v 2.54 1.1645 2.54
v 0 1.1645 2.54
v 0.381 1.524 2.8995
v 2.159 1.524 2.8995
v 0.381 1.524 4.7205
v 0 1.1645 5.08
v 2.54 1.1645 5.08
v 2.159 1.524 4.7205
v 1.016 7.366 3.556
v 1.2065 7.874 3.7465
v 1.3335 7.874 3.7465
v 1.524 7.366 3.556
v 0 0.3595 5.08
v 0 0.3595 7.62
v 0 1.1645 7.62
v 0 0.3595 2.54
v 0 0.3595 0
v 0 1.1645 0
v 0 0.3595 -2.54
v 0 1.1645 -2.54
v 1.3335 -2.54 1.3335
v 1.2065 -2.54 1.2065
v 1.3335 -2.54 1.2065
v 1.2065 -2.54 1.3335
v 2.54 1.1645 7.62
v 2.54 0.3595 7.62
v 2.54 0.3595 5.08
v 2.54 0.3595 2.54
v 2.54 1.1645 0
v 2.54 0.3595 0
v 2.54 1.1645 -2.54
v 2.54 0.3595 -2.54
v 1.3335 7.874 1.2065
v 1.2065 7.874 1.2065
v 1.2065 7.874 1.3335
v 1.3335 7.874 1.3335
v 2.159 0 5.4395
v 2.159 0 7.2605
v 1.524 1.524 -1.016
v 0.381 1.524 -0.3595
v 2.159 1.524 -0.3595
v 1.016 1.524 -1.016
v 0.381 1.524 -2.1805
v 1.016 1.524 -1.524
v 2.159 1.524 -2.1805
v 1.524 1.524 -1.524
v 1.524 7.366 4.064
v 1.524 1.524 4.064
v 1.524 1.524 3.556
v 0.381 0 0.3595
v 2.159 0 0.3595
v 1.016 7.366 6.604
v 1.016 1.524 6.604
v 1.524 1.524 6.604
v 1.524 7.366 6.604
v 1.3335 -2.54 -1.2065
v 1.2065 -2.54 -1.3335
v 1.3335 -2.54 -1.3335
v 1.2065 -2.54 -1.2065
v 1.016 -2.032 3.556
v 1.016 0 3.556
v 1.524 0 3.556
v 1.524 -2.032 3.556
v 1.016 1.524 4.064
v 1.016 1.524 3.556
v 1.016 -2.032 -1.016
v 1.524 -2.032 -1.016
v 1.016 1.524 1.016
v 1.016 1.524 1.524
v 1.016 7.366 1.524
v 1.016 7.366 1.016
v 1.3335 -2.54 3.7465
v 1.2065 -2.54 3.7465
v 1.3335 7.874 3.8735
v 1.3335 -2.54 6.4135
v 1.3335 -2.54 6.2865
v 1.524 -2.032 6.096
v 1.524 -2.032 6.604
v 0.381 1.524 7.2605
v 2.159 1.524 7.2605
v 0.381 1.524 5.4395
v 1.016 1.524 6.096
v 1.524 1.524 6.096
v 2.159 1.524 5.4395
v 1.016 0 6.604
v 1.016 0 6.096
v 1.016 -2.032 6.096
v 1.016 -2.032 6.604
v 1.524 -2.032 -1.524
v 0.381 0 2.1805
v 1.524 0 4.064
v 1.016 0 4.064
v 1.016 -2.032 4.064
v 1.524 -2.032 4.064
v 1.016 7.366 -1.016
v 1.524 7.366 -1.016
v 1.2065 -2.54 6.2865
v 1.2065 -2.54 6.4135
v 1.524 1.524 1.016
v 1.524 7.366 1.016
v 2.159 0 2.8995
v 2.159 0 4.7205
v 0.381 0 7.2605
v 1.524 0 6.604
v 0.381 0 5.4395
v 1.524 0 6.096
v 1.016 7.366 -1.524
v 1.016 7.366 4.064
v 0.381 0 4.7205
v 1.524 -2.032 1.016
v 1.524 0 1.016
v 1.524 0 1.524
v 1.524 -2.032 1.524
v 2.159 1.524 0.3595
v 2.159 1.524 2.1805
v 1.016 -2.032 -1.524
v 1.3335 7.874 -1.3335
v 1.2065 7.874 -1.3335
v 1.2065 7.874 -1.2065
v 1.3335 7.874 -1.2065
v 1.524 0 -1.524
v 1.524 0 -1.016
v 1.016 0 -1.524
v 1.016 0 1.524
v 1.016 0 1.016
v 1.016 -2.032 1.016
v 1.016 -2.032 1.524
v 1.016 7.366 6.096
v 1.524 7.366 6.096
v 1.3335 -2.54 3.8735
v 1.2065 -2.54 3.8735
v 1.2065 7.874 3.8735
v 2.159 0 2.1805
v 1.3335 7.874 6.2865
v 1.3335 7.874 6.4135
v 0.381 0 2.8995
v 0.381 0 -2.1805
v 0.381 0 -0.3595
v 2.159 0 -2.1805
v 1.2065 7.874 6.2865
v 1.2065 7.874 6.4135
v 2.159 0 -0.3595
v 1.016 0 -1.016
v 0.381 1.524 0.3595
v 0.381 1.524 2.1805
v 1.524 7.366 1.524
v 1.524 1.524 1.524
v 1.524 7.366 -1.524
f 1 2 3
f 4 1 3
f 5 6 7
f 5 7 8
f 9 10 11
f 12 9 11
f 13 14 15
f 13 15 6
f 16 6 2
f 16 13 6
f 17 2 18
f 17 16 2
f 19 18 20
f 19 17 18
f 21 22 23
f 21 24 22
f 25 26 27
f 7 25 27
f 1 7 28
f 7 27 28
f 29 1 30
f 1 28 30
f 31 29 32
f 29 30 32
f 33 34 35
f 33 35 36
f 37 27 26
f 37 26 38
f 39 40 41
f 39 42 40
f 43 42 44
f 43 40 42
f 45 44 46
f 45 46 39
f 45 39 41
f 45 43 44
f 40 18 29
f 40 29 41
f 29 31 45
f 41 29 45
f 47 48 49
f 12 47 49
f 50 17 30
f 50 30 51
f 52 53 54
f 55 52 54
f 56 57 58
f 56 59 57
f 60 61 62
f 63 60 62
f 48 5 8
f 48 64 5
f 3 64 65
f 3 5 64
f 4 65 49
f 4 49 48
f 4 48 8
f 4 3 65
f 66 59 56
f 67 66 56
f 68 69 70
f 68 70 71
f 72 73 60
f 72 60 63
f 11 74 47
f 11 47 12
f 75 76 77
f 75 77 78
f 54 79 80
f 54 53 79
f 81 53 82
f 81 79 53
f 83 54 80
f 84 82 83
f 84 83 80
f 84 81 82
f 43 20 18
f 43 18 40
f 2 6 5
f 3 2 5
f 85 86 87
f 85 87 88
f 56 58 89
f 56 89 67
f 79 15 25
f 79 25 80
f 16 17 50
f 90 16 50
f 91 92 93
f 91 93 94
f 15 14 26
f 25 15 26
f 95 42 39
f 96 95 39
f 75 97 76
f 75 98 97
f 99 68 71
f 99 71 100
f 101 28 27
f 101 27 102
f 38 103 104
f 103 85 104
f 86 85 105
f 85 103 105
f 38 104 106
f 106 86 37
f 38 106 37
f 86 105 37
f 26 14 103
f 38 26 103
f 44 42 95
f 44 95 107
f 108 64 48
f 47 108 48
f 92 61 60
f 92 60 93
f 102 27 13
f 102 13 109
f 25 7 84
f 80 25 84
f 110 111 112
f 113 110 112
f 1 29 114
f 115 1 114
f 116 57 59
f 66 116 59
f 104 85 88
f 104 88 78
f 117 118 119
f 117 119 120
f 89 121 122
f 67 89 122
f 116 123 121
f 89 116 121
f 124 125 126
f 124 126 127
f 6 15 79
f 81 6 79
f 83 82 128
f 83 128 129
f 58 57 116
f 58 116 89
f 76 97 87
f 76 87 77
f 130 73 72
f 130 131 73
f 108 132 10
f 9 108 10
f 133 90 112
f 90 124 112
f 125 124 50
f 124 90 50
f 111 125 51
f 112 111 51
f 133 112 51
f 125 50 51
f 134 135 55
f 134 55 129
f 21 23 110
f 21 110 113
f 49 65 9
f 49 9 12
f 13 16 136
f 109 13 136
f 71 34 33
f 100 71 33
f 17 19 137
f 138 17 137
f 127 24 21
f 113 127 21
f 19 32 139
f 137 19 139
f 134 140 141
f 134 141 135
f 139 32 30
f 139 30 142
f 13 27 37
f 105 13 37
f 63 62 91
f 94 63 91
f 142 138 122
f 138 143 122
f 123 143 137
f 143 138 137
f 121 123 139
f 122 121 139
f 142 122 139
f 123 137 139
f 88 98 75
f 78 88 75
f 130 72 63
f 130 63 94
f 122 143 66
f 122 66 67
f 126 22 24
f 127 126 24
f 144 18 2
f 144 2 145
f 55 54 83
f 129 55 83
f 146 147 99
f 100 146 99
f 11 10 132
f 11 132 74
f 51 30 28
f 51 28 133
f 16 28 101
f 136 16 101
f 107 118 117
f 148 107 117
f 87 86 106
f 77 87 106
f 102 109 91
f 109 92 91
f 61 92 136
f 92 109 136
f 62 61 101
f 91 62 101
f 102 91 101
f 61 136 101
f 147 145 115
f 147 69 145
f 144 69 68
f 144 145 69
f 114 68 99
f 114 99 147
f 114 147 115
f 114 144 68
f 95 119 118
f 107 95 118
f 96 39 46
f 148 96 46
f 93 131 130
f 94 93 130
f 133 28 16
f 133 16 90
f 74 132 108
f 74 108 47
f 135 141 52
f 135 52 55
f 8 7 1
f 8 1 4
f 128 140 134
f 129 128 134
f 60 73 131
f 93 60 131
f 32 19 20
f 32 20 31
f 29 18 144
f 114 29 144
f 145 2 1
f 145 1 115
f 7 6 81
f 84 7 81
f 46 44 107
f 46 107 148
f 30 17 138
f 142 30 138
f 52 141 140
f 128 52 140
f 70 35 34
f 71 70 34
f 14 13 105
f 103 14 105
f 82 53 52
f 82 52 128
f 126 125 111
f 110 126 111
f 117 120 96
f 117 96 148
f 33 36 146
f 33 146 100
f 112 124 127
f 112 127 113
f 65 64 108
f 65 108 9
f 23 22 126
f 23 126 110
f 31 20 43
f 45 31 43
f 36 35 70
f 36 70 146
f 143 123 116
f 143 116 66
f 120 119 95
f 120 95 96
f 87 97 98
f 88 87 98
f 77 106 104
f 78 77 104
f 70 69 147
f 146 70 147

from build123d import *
from OCP.BRepFilletAPI import BRepFilletAPI_MakeChamfer

# Parameters (mm, degrees)
SKETCH1_W                   = 2.54
SKETCH1_H                   = 2.54
BOSS_EXTRUDE1_DEPTH         = 1.524
SKETCH2_W                   = 0.508
SKETCH2_H                   = 0.508
BOSS_EXTRUDE2_DEPTH         = 6.35
SKETCH3_W                   = 0.508
SKETCH3_H                   = 0.508
BOSS_EXTRUDE3_DEPTH         = 2.54
CHAMFER1_SIZE               = 0.508
CHAMFER1_SIZE2              = 0.1905
CHAMFER2_SIZE               = 0.508
CHAMFER2_SIZE2              = 0.1905
CUT_EXTRUDE1_DEPTH          = 2.54
CUT_EXTRUDE2_DEPTH          = 2.54
LPATTERN5_COUNT             = 4
LPATTERN5_PITCH             = 2.54
CHAMFER1_OF_LPATTERN5_SIZE  = 0.508
CHAMFER1_OF_LPATTERN5_SIZE2 = 0.1905
CHAMFER2_OF_LPATTERN5_SIZE  = 0.508
CHAMFER2_OF_LPATTERN5_SIZE2 = 0.1905


with BuildPart() as part:
    # Sketch1 → Boss-Extrude1 (new body)
    with BuildSketch(Plane(origin=(0, 0, 0), x_dir=(1, 0, 0), z_dir=(0, 1, 0))):
        with Locations((1.27, 1.27)):
            Rectangle(SKETCH1_W, SKETCH1_H)
    boss_extrude1 = extrude(amount=BOSS_EXTRUDE1_DEPTH)

    # Sketch2 → Boss-Extrude2 (add)
    with BuildSketch(Plane(origin=(0, 1.524, 0), x_dir=(1, 0, 0), z_dir=(0, 1, 0))):
        with Locations((1.27, 1.27)):
            Rectangle(SKETCH2_W, SKETCH2_H)
    boss_extrude2 = extrude(amount=BOSS_EXTRUDE2_DEPTH)

    # Sketch3 → Boss-Extrude3 (add)
    with BuildSketch(Plane.XZ):
        with Locations((1.27, -1.27)):
            Rectangle(SKETCH3_W, SKETCH3_H)
    boss_extrude3 = extrude(amount=BOSS_EXTRUDE3_DEPTH)

    # Chamfer1: one chamfer whose edges measure the first distance from different faces: ONE call of the kernel's chamfer builder (chamfer() names one face for all edges)
    chamfer1_edges_1 = [part.edges().sort_by_distance(p)[0] for p in [
        (1.016, 7.874, -1.27),
    ]]
    chamfer1_side_1 = [part.faces().sort_by_distance(p)[0] for p in [
        (1.016, 4.699, -1.27),
    ]]
    chamfer1_edges_2 = [part.edges().sort_by_distance(p)[0] for p in [
        (1.27, 7.874, -1.016),
    ]]
    chamfer1_side_2 = [part.faces().sort_by_distance(p)[0] for p in [
        (1.27, 4.699, -1.016),
    ]]
    chamfer1_edges_3 = [part.edges().sort_by_distance(p)[0] for p in [
        (1.524, 7.874, -1.27),
    ]]
    chamfer1_side_3 = [part.faces().sort_by_distance(p)[0] for p in [
        (1.524, 4.699, -1.27),
    ]]
    chamfer1_edges_4 = [part.edges().sort_by_distance(p)[0] for p in [
        (1.27, 7.874, -1.524),
    ]]
    chamfer1_side_4 = [part.faces().sort_by_distance(p)[0] for p in [
        (1.27, 4.699, -1.524),
    ]]
    chamfer1 = BRepFilletAPI_MakeChamfer(part.part.solid().wrapped)
    for e in chamfer1_edges_1:
        chamfer1.Add(CHAMFER1_SIZE, CHAMFER1_SIZE2, e.wrapped, chamfer1_side_1[0].wrapped)  # the first distance lies on this face
    for e in chamfer1_edges_2:
        chamfer1.Add(CHAMFER1_SIZE, CHAMFER1_SIZE2, e.wrapped, chamfer1_side_2[0].wrapped)  # the first distance lies on this face
    for e in chamfer1_edges_3:
        chamfer1.Add(CHAMFER1_SIZE, CHAMFER1_SIZE2, e.wrapped, chamfer1_side_3[0].wrapped)  # the first distance lies on this face
    for e in chamfer1_edges_4:
        chamfer1.Add(CHAMFER1_SIZE, CHAMFER1_SIZE2, e.wrapped, chamfer1_side_4[0].wrapped)  # the first distance lies on this face
    add(Compound.cast(chamfer1.Shape()), mode=Mode.REPLACE)

    # Chamfer2: one chamfer whose edges measure the first distance from different faces: ONE call of the kernel's chamfer builder (chamfer() names one face for all edges)
    chamfer2_edges_1 = [part.edges().sort_by_distance(p)[0] for p in [
        (1.27, -2.54, -1.524),
    ]]
    chamfer2_side_1 = [part.faces().sort_by_distance(p)[0] for p in [
        (1.27, -1.27, -1.524),
    ]]
    chamfer2_edges_2 = [part.edges().sort_by_distance(p)[0] for p in [
        (1.524, -2.54, -1.27),
    ]]
    chamfer2_side_2 = [part.faces().sort_by_distance(p)[0] for p in [
        (1.524, -1.27, -1.27),
    ]]
    chamfer2_edges_3 = [part.edges().sort_by_distance(p)[0] for p in [
        (1.27, -2.54, -1.016),
    ]]
    chamfer2_side_3 = [part.faces().sort_by_distance(p)[0] for p in [
        (1.27, -1.27, -1.016),
    ]]
    chamfer2_edges_4 = [part.edges().sort_by_distance(p)[0] for p in [
        (1.016, -2.54, -1.27),
    ]]
    chamfer2_side_4 = [part.faces().sort_by_distance(p)[0] for p in [
        (1.016, -1.27, -1.27),
    ]]
    chamfer2 = BRepFilletAPI_MakeChamfer(part.part.solid().wrapped)
    for e in chamfer2_edges_1:
        chamfer2.Add(CHAMFER2_SIZE, CHAMFER2_SIZE2, e.wrapped, chamfer2_side_1[0].wrapped)  # the first distance lies on this face
    for e in chamfer2_edges_2:
        chamfer2.Add(CHAMFER2_SIZE, CHAMFER2_SIZE2, e.wrapped, chamfer2_side_2[0].wrapped)  # the first distance lies on this face
    for e in chamfer2_edges_3:
        chamfer2.Add(CHAMFER2_SIZE, CHAMFER2_SIZE2, e.wrapped, chamfer2_side_3[0].wrapped)  # the first distance lies on this face
    for e in chamfer2_edges_4:
        chamfer2.Add(CHAMFER2_SIZE, CHAMFER2_SIZE2, e.wrapped, chamfer2_side_4[0].wrapped)  # the first distance lies on this face
    add(Compound.cast(chamfer2.Shape()), mode=Mode.REPLACE)

    # Sketch4 → Cut-Extrude1 (cut)
    with BuildSketch(Plane(origin=(0, 0, -2.54), x_dir=(-1, 0, 0), z_dir=(0, 0, -1))):
        Polygon((-2.54, 1.16453539), (-2.159, 1.524), (-2.54, 1.524), align=None)
        Polygon((0, 1.524), (0, 1.16453539), (-0.381, 1.524), align=None)
        Polygon((0, 0.35946461), (-0.381, 0), (0, 0), align=None)
        Polygon((-2.54, 0), (-2.54, 0.35946461), (-2.159, 0), align=None)
    cut_extrude1 = extrude(amount=-CUT_EXTRUDE1_DEPTH, mode=Mode.SUBTRACT)

    # Sketch5 → Cut-Extrude2 (cut)
    with BuildSketch(Plane.ZY):
        Polygon((-2.54, 1.16453539), (-2.159, 1.54553539), (-2.54, 1.54553539), align=None)
        Polygon((0, 1.54553539), (0, 1.16453539), (-0.381, 1.54553539), align=None)
        Polygon((-2.54, -0.02153539), (-2.54, 0.35946461), (-2.159, -0.02153539), align=None)
        Polygon((0, 0.35946461), (-0.381, -0.02153539), (0, -0.02153539), align=None)
    cut_extrude2 = extrude(amount=-CUT_EXTRUDE2_DEPTH, mode=Mode.SUBTRACT)

    # LPattern5: Boss-Extrude1, Boss-Extrude2, Boss-Extrude3, Cut-Extrude1, Cut-Extrude2 ×4
    with Locations(*[(0, 0, i * LPATTERN5_PITCH) for i in range(1, LPATTERN5_COUNT)]):
        add(boss_extrude1)
        add(boss_extrude2)
        add(boss_extrude3)
        add(cut_extrude1, mode=Mode.SUBTRACT)
        add(cut_extrude2, mode=Mode.SUBTRACT)

    # Chamfer1 of LPattern5: one chamfer whose edges measure the first distance from different faces: ONE call of the kernel's chamfer builder (chamfer() names one face for all edges)
    chamfer1_of_lpattern5_edges_1 = [part.edges().sort_by_distance(p)[0] for p in [
        (1.016, 7.874, 1.27),
    ]]
    chamfer1_of_lpattern5_side_1 = [part.faces().sort_by_distance(p)[0] for p in [
        (1.016, 4.699, 1.27),
    ]]
    chamfer1_of_lpattern5_edges_2 = [part.edges().sort_by_distance(p)[0] for p in [
        (1.27, 7.874, 1.524),
    ]]
    chamfer1_of_lpattern5_side_2 = [part.faces().sort_by_distance(p)[0] for p in [
        (1.27, 4.699, 1.524),
    ]]
    chamfer1_of_lpattern5_edges_3 = [part.edges().sort_by_distance(p)[0] for p in [
        (1.524, 7.874, 1.27),
    ]]
    chamfer1_of_lpattern5_side_3 = [part.faces().sort_by_distance(p)[0] for p in [
        (1.524, 4.699, 1.27),
    ]]
    chamfer1_of_lpattern5_edges_4 = [part.edges().sort_by_distance(p)[0] for p in [
        (1.27, 7.874, 1.016),
    ]]
    chamfer1_of_lpattern5_side_4 = [part.faces().sort_by_distance(p)[0] for p in [
        (1.27, 4.699, 1.016),
    ]]
    chamfer1_of_lpattern5_edges_5 = [part.edges().sort_by_distance(p)[0] for p in [
        (1.016, 7.874, 3.81),
    ]]
    chamfer1_of_lpattern5_side_5 = [part.faces().sort_by_distance(p)[0] for p in [
        (1.016, 4.699, 3.81),
    ]]
    chamfer1_of_lpattern5_edges_6 = [part.edges().sort_by_distance(p)[0] for p in [
        (1.27, 7.874, 4.064),
    ]]
    chamfer1_of_lpattern5_side_6 = [part.faces().sort_by_distance(p)[0] for p in [
        (1.27, 4.699, 4.064),
    ]]
    chamfer1_of_lpattern5_edges_7 = [part.edges().sort_by_distance(p)[0] for p in [
        (1.524, 7.874, 3.81),
    ]]
    chamfer1_of_lpattern5_side_7 = [part.faces().sort_by_distance(p)[0] for p in [
        (1.524, 4.699, 3.81),
    ]]
    chamfer1_of_lpattern5_edges_8 = [part.edges().sort_by_distance(p)[0] for p in [
        (1.27, 7.874, 3.556),
    ]]
    chamfer1_of_lpattern5_side_8 = [part.faces().sort_by_distance(p)[0] for p in [
        (1.27, 4.699, 3.556),
    ]]
    chamfer1_of_lpattern5_edges_9 = [part.edges().sort_by_distance(p)[0] for p in [
        (1.016, 7.874, 6.35),
    ]]
    chamfer1_of_lpattern5_side_9 = [part.faces().sort_by_distance(p)[0] for p in [
        (1.016, 4.699, 6.35),
    ]]
    chamfer1_of_lpattern5_edges_10 = [part.edges().sort_by_distance(p)[0] for p in [
        (1.27, 7.874, 6.604),
    ]]
    chamfer1_of_lpattern5_side_10 = [part.faces().sort_by_distance(p)[0] for p in [
        (1.27, 4.699, 6.604),
    ]]
    chamfer1_of_lpattern5_edges_11 = [part.edges().sort_by_distance(p)[0] for p in [
        (1.524, 7.874, 6.35),
    ]]
    chamfer1_of_lpattern5_side_11 = [part.faces().sort_by_distance(p)[0] for p in [
        (1.524, 4.699, 6.35),
    ]]
    chamfer1_of_lpattern5_edges_12 = [part.edges().sort_by_distance(p)[0] for p in [
        (1.27, 7.874, 6.096),
    ]]
    chamfer1_of_lpattern5_side_12 = [part.faces().sort_by_distance(p)[0] for p in [
        (1.27, 4.699, 6.096),
    ]]
    chamfer1_of_lpattern5 = BRepFilletAPI_MakeChamfer(part.part.solid().wrapped)
    for e in chamfer1_of_lpattern5_edges_1:
        chamfer1_of_lpattern5.Add(CHAMFER1_OF_LPATTERN5_SIZE, CHAMFER1_OF_LPATTERN5_SIZE2, e.wrapped, chamfer1_of_lpattern5_side_1[0].wrapped)  # the first distance lies on this face
    for e in chamfer1_of_lpattern5_edges_2:
        chamfer1_of_lpattern5.Add(CHAMFER1_OF_LPATTERN5_SIZE, CHAMFER1_OF_LPATTERN5_SIZE2, e.wrapped, chamfer1_of_lpattern5_side_2[0].wrapped)  # the first distance lies on this face
    for e in chamfer1_of_lpattern5_edges_3:
        chamfer1_of_lpattern5.Add(CHAMFER1_OF_LPATTERN5_SIZE, CHAMFER1_OF_LPATTERN5_SIZE2, e.wrapped, chamfer1_of_lpattern5_side_3[0].wrapped)  # the first distance lies on this face
    for e in chamfer1_of_lpattern5_edges_4:
        chamfer1_of_lpattern5.Add(CHAMFER1_OF_LPATTERN5_SIZE, CHAMFER1_OF_LPATTERN5_SIZE2, e.wrapped, chamfer1_of_lpattern5_side_4[0].wrapped)  # the first distance lies on this face
    for e in chamfer1_of_lpattern5_edges_5:
        chamfer1_of_lpattern5.Add(CHAMFER1_OF_LPATTERN5_SIZE, CHAMFER1_OF_LPATTERN5_SIZE2, e.wrapped, chamfer1_of_lpattern5_side_5[0].wrapped)  # the first distance lies on this face
    for e in chamfer1_of_lpattern5_edges_6:
        chamfer1_of_lpattern5.Add(CHAMFER1_OF_LPATTERN5_SIZE, CHAMFER1_OF_LPATTERN5_SIZE2, e.wrapped, chamfer1_of_lpattern5_side_6[0].wrapped)  # the first distance lies on this face
    for e in chamfer1_of_lpattern5_edges_7:
        chamfer1_of_lpattern5.Add(CHAMFER1_OF_LPATTERN5_SIZE, CHAMFER1_OF_LPATTERN5_SIZE2, e.wrapped, chamfer1_of_lpattern5_side_7[0].wrapped)  # the first distance lies on this face
    for e in chamfer1_of_lpattern5_edges_8:
        chamfer1_of_lpattern5.Add(CHAMFER1_OF_LPATTERN5_SIZE, CHAMFER1_OF_LPATTERN5_SIZE2, e.wrapped, chamfer1_of_lpattern5_side_8[0].wrapped)  # the first distance lies on this face
    for e in chamfer1_of_lpattern5_edges_9:
        chamfer1_of_lpattern5.Add(CHAMFER1_OF_LPATTERN5_SIZE, CHAMFER1_OF_LPATTERN5_SIZE2, e.wrapped, chamfer1_of_lpattern5_side_9[0].wrapped)  # the first distance lies on this face
    for e in chamfer1_of_lpattern5_edges_10:
        chamfer1_of_lpattern5.Add(CHAMFER1_OF_LPATTERN5_SIZE, CHAMFER1_OF_LPATTERN5_SIZE2, e.wrapped, chamfer1_of_lpattern5_side_10[0].wrapped)  # the first distance lies on this face
    for e in chamfer1_of_lpattern5_edges_11:
        chamfer1_of_lpattern5.Add(CHAMFER1_OF_LPATTERN5_SIZE, CHAMFER1_OF_LPATTERN5_SIZE2, e.wrapped, chamfer1_of_lpattern5_side_11[0].wrapped)  # the first distance lies on this face
    for e in chamfer1_of_lpattern5_edges_12:
        chamfer1_of_lpattern5.Add(CHAMFER1_OF_LPATTERN5_SIZE, CHAMFER1_OF_LPATTERN5_SIZE2, e.wrapped, chamfer1_of_lpattern5_side_12[0].wrapped)  # the first distance lies on this face
    add(Compound.cast(chamfer1_of_lpattern5.Shape()), mode=Mode.REPLACE)

    # Chamfer2 of LPattern5: one chamfer whose edges measure the first distance from different faces: ONE call of the kernel's chamfer builder (chamfer() names one face for all edges)
    chamfer2_of_lpattern5_edges_1 = [part.edges().sort_by_distance(p)[0] for p in [
        (1.27, -2.54, 1.016),
    ]]
    chamfer2_of_lpattern5_side_1 = [part.faces().sort_by_distance(p)[0] for p in [
        (1.27, -1.27, 1.016),
    ]]
    chamfer2_of_lpattern5_edges_2 = [part.edges().sort_by_distance(p)[0] for p in [
        (1.524, -2.54, 1.27),
    ]]
    chamfer2_of_lpattern5_side_2 = [part.faces().sort_by_distance(p)[0] for p in [
        (1.524, -1.27, 1.27),
    ]]
    chamfer2_of_lpattern5_edges_3 = [part.edges().sort_by_distance(p)[0] for p in [
        (1.27, -2.54, 1.524),
    ]]
    chamfer2_of_lpattern5_side_3 = [part.faces().sort_by_distance(p)[0] for p in [
        (1.27, -1.27, 1.524),
    ]]
    chamfer2_of_lpattern5_edges_4 = [part.edges().sort_by_distance(p)[0] for p in [
        (1.016, -2.54, 1.27),
    ]]
    chamfer2_of_lpattern5_side_4 = [part.faces().sort_by_distance(p)[0] for p in [
        (1.016, -1.27, 1.27),
    ]]
    chamfer2_of_lpattern5_edges_5 = [part.edges().sort_by_distance(p)[0] for p in [
        (1.27, -2.54, 3.556),
    ]]
    chamfer2_of_lpattern5_side_5 = [part.faces().sort_by_distance(p)[0] for p in [
        (1.27, -1.27, 3.556),
    ]]
    chamfer2_of_lpattern5_edges_6 = [part.edges().sort_by_distance(p)[0] for p in [
        (1.524, -2.54, 3.81),
    ]]
    chamfer2_of_lpattern5_side_6 = [part.faces().sort_by_distance(p)[0] for p in [
        (1.524, -1.27, 3.81),
    ]]
    chamfer2_of_lpattern5_edges_7 = [part.edges().sort_by_distance(p)[0] for p in [
        (1.27, -2.54, 4.064),
    ]]
    chamfer2_of_lpattern5_side_7 = [part.faces().sort_by_distance(p)[0] for p in [
        (1.27, -1.27, 4.064),
    ]]
    chamfer2_of_lpattern5_edges_8 = [part.edges().sort_by_distance(p)[0] for p in [
        (1.016, -2.54, 3.81),
    ]]
    chamfer2_of_lpattern5_side_8 = [part.faces().sort_by_distance(p)[0] for p in [
        (1.016, -1.27, 3.81),
    ]]
    chamfer2_of_lpattern5_edges_9 = [part.edges().sort_by_distance(p)[0] for p in [
        (1.27, -2.54, 6.096),
    ]]
    chamfer2_of_lpattern5_side_9 = [part.faces().sort_by_distance(p)[0] for p in [
        (1.27, -1.27, 6.096),
    ]]
    chamfer2_of_lpattern5_edges_10 = [part.edges().sort_by_distance(p)[0] for p in [
        (1.524, -2.54, 6.35),
    ]]
    chamfer2_of_lpattern5_side_10 = [part.faces().sort_by_distance(p)[0] for p in [
        (1.524, -1.27, 6.35),
    ]]
    chamfer2_of_lpattern5_edges_11 = [part.edges().sort_by_distance(p)[0] for p in [
        (1.27, -2.54, 6.604),
    ]]
    chamfer2_of_lpattern5_side_11 = [part.faces().sort_by_distance(p)[0] for p in [
        (1.27, -1.27, 6.604),
    ]]
    chamfer2_of_lpattern5_edges_12 = [part.edges().sort_by_distance(p)[0] for p in [
        (1.016, -2.54, 6.35),
    ]]
    chamfer2_of_lpattern5_side_12 = [part.faces().sort_by_distance(p)[0] for p in [
        (1.016, -1.27, 6.35),
    ]]
    chamfer2_of_lpattern5 = BRepFilletAPI_MakeChamfer(part.part.solid().wrapped)
    for e in chamfer2_of_lpattern5_edges_1:
        chamfer2_of_lpattern5.Add(CHAMFER2_OF_LPATTERN5_SIZE, CHAMFER2_OF_LPATTERN5_SIZE2, e.wrapped, chamfer2_of_lpattern5_side_1[0].wrapped)  # the first distance lies on this face
    for e in chamfer2_of_lpattern5_edges_2:
        chamfer2_of_lpattern5.Add(CHAMFER2_OF_LPATTERN5_SIZE, CHAMFER2_OF_LPATTERN5_SIZE2, e.wrapped, chamfer2_of_lpattern5_side_2[0].wrapped)  # the first distance lies on this face
    for e in chamfer2_of_lpattern5_edges_3:
        chamfer2_of_lpattern5.Add(CHAMFER2_OF_LPATTERN5_SIZE, CHAMFER2_OF_LPATTERN5_SIZE2, e.wrapped, chamfer2_of_lpattern5_side_3[0].wrapped)  # the first distance lies on this face
    for e in chamfer2_of_lpattern5_edges_4:
        chamfer2_of_lpattern5.Add(CHAMFER2_OF_LPATTERN5_SIZE, CHAMFER2_OF_LPATTERN5_SIZE2, e.wrapped, chamfer2_of_lpattern5_side_4[0].wrapped)  # the first distance lies on this face
    for e in chamfer2_of_lpattern5_edges_5:
        chamfer2_of_lpattern5.Add(CHAMFER2_OF_LPATTERN5_SIZE, CHAMFER2_OF_LPATTERN5_SIZE2, e.wrapped, chamfer2_of_lpattern5_side_5[0].wrapped)  # the first distance lies on this face
    for e in chamfer2_of_lpattern5_edges_6:
        chamfer2_of_lpattern5.Add(CHAMFER2_OF_LPATTERN5_SIZE, CHAMFER2_OF_LPATTERN5_SIZE2, e.wrapped, chamfer2_of_lpattern5_side_6[0].wrapped)  # the first distance lies on this face
    for e in chamfer2_of_lpattern5_edges_7:
        chamfer2_of_lpattern5.Add(CHAMFER2_OF_LPATTERN5_SIZE, CHAMFER2_OF_LPATTERN5_SIZE2, e.wrapped, chamfer2_of_lpattern5_side_7[0].wrapped)  # the first distance lies on this face
    for e in chamfer2_of_lpattern5_edges_8:
        chamfer2_of_lpattern5.Add(CHAMFER2_OF_LPATTERN5_SIZE, CHAMFER2_OF_LPATTERN5_SIZE2, e.wrapped, chamfer2_of_lpattern5_side_8[0].wrapped)  # the first distance lies on this face
    for e in chamfer2_of_lpattern5_edges_9:
        chamfer2_of_lpattern5.Add(CHAMFER2_OF_LPATTERN5_SIZE, CHAMFER2_OF_LPATTERN5_SIZE2, e.wrapped, chamfer2_of_lpattern5_side_9[0].wrapped)  # the first distance lies on this face
    for e in chamfer2_of_lpattern5_edges_10:
        chamfer2_of_lpattern5.Add(CHAMFER2_OF_LPATTERN5_SIZE, CHAMFER2_OF_LPATTERN5_SIZE2, e.wrapped, chamfer2_of_lpattern5_side_10[0].wrapped)  # the first distance lies on this face
    for e in chamfer2_of_lpattern5_edges_11:
        chamfer2_of_lpattern5.Add(CHAMFER2_OF_LPATTERN5_SIZE, CHAMFER2_OF_LPATTERN5_SIZE2, e.wrapped, chamfer2_of_lpattern5_side_11[0].wrapped)  # the first distance lies on this face
    for e in chamfer2_of_lpattern5_edges_12:
        chamfer2_of_lpattern5.Add(CHAMFER2_OF_LPATTERN5_SIZE, CHAMFER2_OF_LPATTERN5_SIZE2, e.wrapped, chamfer2_of_lpattern5_side_12[0].wrapped)  # the first distance lies on this face
    add(Compound.cast(chamfer2_of_lpattern5.Shape()), mode=Mode.REPLACE)


solid = part.part
